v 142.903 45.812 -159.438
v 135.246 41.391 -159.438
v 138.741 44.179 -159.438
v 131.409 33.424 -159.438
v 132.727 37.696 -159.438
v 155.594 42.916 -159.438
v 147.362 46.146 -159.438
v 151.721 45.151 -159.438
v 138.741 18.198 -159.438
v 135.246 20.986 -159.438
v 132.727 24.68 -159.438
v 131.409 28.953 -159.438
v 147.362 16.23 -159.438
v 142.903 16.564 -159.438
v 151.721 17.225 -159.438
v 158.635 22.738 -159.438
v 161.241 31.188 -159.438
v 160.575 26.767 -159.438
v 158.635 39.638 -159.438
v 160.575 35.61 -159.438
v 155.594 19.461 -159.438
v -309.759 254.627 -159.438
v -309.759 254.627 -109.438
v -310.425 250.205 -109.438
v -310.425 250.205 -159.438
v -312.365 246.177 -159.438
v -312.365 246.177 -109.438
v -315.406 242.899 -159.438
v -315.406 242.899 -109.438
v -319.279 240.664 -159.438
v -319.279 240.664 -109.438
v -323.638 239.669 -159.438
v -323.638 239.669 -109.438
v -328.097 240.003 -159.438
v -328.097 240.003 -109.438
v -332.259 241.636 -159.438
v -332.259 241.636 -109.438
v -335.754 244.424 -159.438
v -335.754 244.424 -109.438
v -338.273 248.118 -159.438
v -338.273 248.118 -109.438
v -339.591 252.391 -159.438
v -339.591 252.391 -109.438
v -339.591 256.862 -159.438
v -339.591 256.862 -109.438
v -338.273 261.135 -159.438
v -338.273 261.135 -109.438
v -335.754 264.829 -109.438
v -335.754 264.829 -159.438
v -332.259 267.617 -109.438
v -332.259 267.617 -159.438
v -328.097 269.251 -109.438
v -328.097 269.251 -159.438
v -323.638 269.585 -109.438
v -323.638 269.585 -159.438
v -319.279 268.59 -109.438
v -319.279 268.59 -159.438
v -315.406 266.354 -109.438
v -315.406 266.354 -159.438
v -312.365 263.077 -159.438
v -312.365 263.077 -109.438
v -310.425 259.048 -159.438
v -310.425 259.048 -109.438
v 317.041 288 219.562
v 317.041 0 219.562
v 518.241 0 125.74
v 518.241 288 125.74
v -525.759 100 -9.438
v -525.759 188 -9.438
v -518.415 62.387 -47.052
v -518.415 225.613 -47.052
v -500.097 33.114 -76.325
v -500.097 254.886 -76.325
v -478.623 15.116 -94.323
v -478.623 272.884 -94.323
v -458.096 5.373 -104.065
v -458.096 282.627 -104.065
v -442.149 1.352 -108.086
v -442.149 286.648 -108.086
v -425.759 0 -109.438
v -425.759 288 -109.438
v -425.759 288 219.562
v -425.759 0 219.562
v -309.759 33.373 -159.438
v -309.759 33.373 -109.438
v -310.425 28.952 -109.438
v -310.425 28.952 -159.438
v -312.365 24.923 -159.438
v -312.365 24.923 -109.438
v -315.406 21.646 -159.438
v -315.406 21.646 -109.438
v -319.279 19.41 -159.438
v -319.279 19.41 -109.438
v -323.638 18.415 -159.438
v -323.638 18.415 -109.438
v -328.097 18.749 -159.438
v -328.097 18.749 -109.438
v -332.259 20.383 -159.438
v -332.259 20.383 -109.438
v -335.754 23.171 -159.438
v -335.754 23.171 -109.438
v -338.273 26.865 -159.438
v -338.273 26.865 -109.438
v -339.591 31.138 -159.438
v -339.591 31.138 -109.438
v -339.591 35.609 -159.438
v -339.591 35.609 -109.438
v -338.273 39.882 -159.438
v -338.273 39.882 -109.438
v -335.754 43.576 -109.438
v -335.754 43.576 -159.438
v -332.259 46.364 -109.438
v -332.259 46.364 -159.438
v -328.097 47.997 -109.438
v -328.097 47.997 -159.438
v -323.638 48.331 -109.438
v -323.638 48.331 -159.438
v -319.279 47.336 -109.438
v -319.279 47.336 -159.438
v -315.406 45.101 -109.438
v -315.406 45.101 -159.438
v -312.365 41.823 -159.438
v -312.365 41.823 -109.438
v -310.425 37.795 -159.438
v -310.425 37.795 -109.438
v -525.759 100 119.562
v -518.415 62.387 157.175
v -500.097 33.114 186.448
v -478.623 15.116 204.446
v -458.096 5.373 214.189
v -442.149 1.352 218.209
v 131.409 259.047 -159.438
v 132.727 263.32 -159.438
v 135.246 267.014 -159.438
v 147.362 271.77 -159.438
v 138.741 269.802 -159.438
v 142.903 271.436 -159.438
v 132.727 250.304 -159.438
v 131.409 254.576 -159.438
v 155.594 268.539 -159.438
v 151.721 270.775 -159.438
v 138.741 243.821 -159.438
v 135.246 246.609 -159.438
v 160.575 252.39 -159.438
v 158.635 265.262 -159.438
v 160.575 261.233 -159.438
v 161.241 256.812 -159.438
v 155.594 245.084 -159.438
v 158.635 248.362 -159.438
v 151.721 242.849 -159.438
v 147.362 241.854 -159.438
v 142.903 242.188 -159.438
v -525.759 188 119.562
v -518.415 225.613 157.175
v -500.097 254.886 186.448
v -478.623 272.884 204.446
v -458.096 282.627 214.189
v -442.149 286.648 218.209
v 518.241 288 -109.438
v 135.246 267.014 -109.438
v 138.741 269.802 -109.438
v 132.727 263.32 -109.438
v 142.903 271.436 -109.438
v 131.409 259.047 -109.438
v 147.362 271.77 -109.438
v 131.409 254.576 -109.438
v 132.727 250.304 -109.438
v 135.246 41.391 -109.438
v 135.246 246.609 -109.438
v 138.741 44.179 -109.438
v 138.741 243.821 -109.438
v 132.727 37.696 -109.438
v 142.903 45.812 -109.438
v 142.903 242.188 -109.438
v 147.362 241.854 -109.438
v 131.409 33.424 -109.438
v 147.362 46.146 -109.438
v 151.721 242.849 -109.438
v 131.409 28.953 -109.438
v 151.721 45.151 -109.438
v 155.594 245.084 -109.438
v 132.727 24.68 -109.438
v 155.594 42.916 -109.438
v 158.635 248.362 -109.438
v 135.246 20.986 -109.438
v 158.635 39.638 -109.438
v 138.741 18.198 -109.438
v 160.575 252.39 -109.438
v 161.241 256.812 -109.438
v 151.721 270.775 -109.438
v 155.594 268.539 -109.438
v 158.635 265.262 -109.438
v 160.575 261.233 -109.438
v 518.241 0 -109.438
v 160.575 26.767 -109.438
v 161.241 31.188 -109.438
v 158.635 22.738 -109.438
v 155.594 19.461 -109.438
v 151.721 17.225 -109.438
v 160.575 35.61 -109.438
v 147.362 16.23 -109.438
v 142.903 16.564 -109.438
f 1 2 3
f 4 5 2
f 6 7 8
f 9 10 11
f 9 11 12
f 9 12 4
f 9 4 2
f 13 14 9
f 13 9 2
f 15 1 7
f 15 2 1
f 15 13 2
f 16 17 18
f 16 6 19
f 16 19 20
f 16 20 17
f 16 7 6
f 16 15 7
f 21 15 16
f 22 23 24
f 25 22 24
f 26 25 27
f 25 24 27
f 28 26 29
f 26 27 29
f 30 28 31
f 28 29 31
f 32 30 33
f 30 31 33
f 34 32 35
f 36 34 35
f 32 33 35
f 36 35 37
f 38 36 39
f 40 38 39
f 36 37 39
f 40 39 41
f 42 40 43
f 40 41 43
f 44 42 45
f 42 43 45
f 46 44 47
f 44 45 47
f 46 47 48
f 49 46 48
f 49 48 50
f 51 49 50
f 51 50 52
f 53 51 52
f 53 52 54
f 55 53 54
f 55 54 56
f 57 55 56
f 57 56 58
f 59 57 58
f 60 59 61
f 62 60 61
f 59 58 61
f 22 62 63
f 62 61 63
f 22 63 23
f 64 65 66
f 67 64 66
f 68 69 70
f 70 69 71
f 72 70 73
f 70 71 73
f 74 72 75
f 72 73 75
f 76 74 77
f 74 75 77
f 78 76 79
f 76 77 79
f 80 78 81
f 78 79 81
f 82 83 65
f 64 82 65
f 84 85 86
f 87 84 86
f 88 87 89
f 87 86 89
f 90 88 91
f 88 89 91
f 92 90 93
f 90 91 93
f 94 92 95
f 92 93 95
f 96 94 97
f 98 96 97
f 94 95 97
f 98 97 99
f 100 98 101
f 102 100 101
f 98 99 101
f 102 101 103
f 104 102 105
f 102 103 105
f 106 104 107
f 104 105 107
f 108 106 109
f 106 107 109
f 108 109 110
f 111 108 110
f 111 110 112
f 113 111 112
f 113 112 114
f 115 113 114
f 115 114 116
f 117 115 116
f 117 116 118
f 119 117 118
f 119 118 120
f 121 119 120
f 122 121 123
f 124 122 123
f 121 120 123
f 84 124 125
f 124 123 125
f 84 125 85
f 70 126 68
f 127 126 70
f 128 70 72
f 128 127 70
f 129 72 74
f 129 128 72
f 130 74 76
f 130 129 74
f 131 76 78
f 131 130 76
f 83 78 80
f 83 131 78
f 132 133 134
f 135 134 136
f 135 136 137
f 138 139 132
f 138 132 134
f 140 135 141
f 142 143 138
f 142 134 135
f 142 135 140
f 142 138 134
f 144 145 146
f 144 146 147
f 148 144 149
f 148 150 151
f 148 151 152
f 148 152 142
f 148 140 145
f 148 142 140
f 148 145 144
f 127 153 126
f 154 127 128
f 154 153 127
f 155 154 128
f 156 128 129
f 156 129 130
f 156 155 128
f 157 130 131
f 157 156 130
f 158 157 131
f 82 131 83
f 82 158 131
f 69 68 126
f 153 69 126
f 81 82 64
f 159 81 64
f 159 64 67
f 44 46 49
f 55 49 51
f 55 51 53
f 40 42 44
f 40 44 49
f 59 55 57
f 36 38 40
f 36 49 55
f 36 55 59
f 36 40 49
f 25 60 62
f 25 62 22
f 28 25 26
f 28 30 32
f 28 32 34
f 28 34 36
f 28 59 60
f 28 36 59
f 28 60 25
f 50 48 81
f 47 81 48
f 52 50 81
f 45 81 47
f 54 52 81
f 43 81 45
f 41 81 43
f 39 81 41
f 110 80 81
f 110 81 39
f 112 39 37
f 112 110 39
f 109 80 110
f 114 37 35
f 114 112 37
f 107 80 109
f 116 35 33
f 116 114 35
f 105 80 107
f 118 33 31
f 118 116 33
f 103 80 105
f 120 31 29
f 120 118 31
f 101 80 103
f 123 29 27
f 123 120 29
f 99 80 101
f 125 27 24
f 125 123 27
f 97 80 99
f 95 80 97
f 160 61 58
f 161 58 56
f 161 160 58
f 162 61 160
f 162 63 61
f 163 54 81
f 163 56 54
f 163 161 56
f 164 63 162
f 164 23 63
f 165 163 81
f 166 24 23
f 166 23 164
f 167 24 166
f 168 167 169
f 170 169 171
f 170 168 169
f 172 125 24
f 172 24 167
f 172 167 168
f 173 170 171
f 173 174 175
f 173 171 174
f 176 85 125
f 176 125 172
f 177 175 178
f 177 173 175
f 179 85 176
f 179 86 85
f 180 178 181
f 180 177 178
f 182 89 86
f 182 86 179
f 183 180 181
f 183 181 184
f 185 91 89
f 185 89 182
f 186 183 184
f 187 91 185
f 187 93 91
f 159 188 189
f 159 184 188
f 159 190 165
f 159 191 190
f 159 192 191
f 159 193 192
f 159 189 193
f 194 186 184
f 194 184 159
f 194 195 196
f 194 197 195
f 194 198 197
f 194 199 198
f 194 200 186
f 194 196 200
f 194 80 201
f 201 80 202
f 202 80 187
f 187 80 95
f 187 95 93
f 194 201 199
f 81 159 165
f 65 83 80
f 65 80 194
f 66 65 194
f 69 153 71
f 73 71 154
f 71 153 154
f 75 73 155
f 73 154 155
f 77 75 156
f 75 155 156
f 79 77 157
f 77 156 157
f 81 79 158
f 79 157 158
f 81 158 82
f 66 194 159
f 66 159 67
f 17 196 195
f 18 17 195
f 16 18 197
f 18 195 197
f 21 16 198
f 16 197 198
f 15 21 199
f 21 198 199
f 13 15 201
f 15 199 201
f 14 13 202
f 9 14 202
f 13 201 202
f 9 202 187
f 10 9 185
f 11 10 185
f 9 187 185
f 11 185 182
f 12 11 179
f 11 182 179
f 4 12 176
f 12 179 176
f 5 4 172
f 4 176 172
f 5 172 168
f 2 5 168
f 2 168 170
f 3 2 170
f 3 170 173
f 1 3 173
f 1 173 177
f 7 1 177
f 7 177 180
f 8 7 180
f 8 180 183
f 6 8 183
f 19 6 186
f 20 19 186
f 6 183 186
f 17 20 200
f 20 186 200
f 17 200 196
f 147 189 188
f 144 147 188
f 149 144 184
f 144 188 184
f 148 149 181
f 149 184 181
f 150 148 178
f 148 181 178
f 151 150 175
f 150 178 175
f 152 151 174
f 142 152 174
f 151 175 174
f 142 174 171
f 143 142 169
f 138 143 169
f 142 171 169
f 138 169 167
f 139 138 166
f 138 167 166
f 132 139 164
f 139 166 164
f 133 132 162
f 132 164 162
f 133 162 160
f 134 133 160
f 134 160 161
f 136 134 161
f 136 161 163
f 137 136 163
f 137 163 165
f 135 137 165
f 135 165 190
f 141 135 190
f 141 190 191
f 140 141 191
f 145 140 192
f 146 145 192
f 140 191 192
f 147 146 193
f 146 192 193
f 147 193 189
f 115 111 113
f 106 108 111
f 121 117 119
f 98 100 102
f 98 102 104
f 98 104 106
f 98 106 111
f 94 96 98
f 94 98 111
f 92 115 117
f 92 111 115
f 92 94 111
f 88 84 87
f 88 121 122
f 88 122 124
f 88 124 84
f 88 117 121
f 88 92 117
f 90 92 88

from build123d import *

# Parameters (mm, degrees)
F0_W     = 1044
F0_H     = 329
F1_DEPTH = 288
F2_R     = 100
F4_DEPTH = 288.001
F5_R     = 15
F6_DEPTH = 50


with BuildPart() as f1:
    # F0 (on Front) → F1 (new body)
    with BuildSketch(Plane.XZ):
        with Locations((-3.758688, 55.06163)):
            Rectangle(F0_W, F0_H)
    extrude(amount=-F1_DEPTH)

    # F2
    f2_edges = [f1.edges().sort_by_distance(p)[0] for p in [
        (-525.758688, 144, 219.56163),
        (-525.758688, 144, -109.43837),
        (-525.758688, 0, 55.06163),
        (-525.758688, 288, 55.06163),
    ]]
    fillet(f2_edges, radius=F2_R)

    # F3 (on face) → F4 (cut, through all)
    with BuildSketch(Plane.XZ):
        Polygon((518.241312, 219.56163), (317.040984, 219.56163), (518.241312, 125.740376), align=None)
    extrude(amount=-F4_DEPTH, mode=Mode.SUBTRACT)

    # F5 (on face) → F6 (join)
    with BuildSketch(Plane(origin=(0, 0, -109.43837), x_dir=(1, 0, 0), z_dir=(0, 0, -1))):
        with Locations((-324.758688, -33.373285)):
            Circle(F5_R)
        with Locations((146.241312, -31.188212)):
            Circle(F5_R)
        with Locations((-324.758688, -254.626715)):
            Circle(F5_R)
        with Locations((146.241312, -256.811788)):
            Circle(F5_R)
    extrude(amount=F6_DEPTH)


solid = f1.part
